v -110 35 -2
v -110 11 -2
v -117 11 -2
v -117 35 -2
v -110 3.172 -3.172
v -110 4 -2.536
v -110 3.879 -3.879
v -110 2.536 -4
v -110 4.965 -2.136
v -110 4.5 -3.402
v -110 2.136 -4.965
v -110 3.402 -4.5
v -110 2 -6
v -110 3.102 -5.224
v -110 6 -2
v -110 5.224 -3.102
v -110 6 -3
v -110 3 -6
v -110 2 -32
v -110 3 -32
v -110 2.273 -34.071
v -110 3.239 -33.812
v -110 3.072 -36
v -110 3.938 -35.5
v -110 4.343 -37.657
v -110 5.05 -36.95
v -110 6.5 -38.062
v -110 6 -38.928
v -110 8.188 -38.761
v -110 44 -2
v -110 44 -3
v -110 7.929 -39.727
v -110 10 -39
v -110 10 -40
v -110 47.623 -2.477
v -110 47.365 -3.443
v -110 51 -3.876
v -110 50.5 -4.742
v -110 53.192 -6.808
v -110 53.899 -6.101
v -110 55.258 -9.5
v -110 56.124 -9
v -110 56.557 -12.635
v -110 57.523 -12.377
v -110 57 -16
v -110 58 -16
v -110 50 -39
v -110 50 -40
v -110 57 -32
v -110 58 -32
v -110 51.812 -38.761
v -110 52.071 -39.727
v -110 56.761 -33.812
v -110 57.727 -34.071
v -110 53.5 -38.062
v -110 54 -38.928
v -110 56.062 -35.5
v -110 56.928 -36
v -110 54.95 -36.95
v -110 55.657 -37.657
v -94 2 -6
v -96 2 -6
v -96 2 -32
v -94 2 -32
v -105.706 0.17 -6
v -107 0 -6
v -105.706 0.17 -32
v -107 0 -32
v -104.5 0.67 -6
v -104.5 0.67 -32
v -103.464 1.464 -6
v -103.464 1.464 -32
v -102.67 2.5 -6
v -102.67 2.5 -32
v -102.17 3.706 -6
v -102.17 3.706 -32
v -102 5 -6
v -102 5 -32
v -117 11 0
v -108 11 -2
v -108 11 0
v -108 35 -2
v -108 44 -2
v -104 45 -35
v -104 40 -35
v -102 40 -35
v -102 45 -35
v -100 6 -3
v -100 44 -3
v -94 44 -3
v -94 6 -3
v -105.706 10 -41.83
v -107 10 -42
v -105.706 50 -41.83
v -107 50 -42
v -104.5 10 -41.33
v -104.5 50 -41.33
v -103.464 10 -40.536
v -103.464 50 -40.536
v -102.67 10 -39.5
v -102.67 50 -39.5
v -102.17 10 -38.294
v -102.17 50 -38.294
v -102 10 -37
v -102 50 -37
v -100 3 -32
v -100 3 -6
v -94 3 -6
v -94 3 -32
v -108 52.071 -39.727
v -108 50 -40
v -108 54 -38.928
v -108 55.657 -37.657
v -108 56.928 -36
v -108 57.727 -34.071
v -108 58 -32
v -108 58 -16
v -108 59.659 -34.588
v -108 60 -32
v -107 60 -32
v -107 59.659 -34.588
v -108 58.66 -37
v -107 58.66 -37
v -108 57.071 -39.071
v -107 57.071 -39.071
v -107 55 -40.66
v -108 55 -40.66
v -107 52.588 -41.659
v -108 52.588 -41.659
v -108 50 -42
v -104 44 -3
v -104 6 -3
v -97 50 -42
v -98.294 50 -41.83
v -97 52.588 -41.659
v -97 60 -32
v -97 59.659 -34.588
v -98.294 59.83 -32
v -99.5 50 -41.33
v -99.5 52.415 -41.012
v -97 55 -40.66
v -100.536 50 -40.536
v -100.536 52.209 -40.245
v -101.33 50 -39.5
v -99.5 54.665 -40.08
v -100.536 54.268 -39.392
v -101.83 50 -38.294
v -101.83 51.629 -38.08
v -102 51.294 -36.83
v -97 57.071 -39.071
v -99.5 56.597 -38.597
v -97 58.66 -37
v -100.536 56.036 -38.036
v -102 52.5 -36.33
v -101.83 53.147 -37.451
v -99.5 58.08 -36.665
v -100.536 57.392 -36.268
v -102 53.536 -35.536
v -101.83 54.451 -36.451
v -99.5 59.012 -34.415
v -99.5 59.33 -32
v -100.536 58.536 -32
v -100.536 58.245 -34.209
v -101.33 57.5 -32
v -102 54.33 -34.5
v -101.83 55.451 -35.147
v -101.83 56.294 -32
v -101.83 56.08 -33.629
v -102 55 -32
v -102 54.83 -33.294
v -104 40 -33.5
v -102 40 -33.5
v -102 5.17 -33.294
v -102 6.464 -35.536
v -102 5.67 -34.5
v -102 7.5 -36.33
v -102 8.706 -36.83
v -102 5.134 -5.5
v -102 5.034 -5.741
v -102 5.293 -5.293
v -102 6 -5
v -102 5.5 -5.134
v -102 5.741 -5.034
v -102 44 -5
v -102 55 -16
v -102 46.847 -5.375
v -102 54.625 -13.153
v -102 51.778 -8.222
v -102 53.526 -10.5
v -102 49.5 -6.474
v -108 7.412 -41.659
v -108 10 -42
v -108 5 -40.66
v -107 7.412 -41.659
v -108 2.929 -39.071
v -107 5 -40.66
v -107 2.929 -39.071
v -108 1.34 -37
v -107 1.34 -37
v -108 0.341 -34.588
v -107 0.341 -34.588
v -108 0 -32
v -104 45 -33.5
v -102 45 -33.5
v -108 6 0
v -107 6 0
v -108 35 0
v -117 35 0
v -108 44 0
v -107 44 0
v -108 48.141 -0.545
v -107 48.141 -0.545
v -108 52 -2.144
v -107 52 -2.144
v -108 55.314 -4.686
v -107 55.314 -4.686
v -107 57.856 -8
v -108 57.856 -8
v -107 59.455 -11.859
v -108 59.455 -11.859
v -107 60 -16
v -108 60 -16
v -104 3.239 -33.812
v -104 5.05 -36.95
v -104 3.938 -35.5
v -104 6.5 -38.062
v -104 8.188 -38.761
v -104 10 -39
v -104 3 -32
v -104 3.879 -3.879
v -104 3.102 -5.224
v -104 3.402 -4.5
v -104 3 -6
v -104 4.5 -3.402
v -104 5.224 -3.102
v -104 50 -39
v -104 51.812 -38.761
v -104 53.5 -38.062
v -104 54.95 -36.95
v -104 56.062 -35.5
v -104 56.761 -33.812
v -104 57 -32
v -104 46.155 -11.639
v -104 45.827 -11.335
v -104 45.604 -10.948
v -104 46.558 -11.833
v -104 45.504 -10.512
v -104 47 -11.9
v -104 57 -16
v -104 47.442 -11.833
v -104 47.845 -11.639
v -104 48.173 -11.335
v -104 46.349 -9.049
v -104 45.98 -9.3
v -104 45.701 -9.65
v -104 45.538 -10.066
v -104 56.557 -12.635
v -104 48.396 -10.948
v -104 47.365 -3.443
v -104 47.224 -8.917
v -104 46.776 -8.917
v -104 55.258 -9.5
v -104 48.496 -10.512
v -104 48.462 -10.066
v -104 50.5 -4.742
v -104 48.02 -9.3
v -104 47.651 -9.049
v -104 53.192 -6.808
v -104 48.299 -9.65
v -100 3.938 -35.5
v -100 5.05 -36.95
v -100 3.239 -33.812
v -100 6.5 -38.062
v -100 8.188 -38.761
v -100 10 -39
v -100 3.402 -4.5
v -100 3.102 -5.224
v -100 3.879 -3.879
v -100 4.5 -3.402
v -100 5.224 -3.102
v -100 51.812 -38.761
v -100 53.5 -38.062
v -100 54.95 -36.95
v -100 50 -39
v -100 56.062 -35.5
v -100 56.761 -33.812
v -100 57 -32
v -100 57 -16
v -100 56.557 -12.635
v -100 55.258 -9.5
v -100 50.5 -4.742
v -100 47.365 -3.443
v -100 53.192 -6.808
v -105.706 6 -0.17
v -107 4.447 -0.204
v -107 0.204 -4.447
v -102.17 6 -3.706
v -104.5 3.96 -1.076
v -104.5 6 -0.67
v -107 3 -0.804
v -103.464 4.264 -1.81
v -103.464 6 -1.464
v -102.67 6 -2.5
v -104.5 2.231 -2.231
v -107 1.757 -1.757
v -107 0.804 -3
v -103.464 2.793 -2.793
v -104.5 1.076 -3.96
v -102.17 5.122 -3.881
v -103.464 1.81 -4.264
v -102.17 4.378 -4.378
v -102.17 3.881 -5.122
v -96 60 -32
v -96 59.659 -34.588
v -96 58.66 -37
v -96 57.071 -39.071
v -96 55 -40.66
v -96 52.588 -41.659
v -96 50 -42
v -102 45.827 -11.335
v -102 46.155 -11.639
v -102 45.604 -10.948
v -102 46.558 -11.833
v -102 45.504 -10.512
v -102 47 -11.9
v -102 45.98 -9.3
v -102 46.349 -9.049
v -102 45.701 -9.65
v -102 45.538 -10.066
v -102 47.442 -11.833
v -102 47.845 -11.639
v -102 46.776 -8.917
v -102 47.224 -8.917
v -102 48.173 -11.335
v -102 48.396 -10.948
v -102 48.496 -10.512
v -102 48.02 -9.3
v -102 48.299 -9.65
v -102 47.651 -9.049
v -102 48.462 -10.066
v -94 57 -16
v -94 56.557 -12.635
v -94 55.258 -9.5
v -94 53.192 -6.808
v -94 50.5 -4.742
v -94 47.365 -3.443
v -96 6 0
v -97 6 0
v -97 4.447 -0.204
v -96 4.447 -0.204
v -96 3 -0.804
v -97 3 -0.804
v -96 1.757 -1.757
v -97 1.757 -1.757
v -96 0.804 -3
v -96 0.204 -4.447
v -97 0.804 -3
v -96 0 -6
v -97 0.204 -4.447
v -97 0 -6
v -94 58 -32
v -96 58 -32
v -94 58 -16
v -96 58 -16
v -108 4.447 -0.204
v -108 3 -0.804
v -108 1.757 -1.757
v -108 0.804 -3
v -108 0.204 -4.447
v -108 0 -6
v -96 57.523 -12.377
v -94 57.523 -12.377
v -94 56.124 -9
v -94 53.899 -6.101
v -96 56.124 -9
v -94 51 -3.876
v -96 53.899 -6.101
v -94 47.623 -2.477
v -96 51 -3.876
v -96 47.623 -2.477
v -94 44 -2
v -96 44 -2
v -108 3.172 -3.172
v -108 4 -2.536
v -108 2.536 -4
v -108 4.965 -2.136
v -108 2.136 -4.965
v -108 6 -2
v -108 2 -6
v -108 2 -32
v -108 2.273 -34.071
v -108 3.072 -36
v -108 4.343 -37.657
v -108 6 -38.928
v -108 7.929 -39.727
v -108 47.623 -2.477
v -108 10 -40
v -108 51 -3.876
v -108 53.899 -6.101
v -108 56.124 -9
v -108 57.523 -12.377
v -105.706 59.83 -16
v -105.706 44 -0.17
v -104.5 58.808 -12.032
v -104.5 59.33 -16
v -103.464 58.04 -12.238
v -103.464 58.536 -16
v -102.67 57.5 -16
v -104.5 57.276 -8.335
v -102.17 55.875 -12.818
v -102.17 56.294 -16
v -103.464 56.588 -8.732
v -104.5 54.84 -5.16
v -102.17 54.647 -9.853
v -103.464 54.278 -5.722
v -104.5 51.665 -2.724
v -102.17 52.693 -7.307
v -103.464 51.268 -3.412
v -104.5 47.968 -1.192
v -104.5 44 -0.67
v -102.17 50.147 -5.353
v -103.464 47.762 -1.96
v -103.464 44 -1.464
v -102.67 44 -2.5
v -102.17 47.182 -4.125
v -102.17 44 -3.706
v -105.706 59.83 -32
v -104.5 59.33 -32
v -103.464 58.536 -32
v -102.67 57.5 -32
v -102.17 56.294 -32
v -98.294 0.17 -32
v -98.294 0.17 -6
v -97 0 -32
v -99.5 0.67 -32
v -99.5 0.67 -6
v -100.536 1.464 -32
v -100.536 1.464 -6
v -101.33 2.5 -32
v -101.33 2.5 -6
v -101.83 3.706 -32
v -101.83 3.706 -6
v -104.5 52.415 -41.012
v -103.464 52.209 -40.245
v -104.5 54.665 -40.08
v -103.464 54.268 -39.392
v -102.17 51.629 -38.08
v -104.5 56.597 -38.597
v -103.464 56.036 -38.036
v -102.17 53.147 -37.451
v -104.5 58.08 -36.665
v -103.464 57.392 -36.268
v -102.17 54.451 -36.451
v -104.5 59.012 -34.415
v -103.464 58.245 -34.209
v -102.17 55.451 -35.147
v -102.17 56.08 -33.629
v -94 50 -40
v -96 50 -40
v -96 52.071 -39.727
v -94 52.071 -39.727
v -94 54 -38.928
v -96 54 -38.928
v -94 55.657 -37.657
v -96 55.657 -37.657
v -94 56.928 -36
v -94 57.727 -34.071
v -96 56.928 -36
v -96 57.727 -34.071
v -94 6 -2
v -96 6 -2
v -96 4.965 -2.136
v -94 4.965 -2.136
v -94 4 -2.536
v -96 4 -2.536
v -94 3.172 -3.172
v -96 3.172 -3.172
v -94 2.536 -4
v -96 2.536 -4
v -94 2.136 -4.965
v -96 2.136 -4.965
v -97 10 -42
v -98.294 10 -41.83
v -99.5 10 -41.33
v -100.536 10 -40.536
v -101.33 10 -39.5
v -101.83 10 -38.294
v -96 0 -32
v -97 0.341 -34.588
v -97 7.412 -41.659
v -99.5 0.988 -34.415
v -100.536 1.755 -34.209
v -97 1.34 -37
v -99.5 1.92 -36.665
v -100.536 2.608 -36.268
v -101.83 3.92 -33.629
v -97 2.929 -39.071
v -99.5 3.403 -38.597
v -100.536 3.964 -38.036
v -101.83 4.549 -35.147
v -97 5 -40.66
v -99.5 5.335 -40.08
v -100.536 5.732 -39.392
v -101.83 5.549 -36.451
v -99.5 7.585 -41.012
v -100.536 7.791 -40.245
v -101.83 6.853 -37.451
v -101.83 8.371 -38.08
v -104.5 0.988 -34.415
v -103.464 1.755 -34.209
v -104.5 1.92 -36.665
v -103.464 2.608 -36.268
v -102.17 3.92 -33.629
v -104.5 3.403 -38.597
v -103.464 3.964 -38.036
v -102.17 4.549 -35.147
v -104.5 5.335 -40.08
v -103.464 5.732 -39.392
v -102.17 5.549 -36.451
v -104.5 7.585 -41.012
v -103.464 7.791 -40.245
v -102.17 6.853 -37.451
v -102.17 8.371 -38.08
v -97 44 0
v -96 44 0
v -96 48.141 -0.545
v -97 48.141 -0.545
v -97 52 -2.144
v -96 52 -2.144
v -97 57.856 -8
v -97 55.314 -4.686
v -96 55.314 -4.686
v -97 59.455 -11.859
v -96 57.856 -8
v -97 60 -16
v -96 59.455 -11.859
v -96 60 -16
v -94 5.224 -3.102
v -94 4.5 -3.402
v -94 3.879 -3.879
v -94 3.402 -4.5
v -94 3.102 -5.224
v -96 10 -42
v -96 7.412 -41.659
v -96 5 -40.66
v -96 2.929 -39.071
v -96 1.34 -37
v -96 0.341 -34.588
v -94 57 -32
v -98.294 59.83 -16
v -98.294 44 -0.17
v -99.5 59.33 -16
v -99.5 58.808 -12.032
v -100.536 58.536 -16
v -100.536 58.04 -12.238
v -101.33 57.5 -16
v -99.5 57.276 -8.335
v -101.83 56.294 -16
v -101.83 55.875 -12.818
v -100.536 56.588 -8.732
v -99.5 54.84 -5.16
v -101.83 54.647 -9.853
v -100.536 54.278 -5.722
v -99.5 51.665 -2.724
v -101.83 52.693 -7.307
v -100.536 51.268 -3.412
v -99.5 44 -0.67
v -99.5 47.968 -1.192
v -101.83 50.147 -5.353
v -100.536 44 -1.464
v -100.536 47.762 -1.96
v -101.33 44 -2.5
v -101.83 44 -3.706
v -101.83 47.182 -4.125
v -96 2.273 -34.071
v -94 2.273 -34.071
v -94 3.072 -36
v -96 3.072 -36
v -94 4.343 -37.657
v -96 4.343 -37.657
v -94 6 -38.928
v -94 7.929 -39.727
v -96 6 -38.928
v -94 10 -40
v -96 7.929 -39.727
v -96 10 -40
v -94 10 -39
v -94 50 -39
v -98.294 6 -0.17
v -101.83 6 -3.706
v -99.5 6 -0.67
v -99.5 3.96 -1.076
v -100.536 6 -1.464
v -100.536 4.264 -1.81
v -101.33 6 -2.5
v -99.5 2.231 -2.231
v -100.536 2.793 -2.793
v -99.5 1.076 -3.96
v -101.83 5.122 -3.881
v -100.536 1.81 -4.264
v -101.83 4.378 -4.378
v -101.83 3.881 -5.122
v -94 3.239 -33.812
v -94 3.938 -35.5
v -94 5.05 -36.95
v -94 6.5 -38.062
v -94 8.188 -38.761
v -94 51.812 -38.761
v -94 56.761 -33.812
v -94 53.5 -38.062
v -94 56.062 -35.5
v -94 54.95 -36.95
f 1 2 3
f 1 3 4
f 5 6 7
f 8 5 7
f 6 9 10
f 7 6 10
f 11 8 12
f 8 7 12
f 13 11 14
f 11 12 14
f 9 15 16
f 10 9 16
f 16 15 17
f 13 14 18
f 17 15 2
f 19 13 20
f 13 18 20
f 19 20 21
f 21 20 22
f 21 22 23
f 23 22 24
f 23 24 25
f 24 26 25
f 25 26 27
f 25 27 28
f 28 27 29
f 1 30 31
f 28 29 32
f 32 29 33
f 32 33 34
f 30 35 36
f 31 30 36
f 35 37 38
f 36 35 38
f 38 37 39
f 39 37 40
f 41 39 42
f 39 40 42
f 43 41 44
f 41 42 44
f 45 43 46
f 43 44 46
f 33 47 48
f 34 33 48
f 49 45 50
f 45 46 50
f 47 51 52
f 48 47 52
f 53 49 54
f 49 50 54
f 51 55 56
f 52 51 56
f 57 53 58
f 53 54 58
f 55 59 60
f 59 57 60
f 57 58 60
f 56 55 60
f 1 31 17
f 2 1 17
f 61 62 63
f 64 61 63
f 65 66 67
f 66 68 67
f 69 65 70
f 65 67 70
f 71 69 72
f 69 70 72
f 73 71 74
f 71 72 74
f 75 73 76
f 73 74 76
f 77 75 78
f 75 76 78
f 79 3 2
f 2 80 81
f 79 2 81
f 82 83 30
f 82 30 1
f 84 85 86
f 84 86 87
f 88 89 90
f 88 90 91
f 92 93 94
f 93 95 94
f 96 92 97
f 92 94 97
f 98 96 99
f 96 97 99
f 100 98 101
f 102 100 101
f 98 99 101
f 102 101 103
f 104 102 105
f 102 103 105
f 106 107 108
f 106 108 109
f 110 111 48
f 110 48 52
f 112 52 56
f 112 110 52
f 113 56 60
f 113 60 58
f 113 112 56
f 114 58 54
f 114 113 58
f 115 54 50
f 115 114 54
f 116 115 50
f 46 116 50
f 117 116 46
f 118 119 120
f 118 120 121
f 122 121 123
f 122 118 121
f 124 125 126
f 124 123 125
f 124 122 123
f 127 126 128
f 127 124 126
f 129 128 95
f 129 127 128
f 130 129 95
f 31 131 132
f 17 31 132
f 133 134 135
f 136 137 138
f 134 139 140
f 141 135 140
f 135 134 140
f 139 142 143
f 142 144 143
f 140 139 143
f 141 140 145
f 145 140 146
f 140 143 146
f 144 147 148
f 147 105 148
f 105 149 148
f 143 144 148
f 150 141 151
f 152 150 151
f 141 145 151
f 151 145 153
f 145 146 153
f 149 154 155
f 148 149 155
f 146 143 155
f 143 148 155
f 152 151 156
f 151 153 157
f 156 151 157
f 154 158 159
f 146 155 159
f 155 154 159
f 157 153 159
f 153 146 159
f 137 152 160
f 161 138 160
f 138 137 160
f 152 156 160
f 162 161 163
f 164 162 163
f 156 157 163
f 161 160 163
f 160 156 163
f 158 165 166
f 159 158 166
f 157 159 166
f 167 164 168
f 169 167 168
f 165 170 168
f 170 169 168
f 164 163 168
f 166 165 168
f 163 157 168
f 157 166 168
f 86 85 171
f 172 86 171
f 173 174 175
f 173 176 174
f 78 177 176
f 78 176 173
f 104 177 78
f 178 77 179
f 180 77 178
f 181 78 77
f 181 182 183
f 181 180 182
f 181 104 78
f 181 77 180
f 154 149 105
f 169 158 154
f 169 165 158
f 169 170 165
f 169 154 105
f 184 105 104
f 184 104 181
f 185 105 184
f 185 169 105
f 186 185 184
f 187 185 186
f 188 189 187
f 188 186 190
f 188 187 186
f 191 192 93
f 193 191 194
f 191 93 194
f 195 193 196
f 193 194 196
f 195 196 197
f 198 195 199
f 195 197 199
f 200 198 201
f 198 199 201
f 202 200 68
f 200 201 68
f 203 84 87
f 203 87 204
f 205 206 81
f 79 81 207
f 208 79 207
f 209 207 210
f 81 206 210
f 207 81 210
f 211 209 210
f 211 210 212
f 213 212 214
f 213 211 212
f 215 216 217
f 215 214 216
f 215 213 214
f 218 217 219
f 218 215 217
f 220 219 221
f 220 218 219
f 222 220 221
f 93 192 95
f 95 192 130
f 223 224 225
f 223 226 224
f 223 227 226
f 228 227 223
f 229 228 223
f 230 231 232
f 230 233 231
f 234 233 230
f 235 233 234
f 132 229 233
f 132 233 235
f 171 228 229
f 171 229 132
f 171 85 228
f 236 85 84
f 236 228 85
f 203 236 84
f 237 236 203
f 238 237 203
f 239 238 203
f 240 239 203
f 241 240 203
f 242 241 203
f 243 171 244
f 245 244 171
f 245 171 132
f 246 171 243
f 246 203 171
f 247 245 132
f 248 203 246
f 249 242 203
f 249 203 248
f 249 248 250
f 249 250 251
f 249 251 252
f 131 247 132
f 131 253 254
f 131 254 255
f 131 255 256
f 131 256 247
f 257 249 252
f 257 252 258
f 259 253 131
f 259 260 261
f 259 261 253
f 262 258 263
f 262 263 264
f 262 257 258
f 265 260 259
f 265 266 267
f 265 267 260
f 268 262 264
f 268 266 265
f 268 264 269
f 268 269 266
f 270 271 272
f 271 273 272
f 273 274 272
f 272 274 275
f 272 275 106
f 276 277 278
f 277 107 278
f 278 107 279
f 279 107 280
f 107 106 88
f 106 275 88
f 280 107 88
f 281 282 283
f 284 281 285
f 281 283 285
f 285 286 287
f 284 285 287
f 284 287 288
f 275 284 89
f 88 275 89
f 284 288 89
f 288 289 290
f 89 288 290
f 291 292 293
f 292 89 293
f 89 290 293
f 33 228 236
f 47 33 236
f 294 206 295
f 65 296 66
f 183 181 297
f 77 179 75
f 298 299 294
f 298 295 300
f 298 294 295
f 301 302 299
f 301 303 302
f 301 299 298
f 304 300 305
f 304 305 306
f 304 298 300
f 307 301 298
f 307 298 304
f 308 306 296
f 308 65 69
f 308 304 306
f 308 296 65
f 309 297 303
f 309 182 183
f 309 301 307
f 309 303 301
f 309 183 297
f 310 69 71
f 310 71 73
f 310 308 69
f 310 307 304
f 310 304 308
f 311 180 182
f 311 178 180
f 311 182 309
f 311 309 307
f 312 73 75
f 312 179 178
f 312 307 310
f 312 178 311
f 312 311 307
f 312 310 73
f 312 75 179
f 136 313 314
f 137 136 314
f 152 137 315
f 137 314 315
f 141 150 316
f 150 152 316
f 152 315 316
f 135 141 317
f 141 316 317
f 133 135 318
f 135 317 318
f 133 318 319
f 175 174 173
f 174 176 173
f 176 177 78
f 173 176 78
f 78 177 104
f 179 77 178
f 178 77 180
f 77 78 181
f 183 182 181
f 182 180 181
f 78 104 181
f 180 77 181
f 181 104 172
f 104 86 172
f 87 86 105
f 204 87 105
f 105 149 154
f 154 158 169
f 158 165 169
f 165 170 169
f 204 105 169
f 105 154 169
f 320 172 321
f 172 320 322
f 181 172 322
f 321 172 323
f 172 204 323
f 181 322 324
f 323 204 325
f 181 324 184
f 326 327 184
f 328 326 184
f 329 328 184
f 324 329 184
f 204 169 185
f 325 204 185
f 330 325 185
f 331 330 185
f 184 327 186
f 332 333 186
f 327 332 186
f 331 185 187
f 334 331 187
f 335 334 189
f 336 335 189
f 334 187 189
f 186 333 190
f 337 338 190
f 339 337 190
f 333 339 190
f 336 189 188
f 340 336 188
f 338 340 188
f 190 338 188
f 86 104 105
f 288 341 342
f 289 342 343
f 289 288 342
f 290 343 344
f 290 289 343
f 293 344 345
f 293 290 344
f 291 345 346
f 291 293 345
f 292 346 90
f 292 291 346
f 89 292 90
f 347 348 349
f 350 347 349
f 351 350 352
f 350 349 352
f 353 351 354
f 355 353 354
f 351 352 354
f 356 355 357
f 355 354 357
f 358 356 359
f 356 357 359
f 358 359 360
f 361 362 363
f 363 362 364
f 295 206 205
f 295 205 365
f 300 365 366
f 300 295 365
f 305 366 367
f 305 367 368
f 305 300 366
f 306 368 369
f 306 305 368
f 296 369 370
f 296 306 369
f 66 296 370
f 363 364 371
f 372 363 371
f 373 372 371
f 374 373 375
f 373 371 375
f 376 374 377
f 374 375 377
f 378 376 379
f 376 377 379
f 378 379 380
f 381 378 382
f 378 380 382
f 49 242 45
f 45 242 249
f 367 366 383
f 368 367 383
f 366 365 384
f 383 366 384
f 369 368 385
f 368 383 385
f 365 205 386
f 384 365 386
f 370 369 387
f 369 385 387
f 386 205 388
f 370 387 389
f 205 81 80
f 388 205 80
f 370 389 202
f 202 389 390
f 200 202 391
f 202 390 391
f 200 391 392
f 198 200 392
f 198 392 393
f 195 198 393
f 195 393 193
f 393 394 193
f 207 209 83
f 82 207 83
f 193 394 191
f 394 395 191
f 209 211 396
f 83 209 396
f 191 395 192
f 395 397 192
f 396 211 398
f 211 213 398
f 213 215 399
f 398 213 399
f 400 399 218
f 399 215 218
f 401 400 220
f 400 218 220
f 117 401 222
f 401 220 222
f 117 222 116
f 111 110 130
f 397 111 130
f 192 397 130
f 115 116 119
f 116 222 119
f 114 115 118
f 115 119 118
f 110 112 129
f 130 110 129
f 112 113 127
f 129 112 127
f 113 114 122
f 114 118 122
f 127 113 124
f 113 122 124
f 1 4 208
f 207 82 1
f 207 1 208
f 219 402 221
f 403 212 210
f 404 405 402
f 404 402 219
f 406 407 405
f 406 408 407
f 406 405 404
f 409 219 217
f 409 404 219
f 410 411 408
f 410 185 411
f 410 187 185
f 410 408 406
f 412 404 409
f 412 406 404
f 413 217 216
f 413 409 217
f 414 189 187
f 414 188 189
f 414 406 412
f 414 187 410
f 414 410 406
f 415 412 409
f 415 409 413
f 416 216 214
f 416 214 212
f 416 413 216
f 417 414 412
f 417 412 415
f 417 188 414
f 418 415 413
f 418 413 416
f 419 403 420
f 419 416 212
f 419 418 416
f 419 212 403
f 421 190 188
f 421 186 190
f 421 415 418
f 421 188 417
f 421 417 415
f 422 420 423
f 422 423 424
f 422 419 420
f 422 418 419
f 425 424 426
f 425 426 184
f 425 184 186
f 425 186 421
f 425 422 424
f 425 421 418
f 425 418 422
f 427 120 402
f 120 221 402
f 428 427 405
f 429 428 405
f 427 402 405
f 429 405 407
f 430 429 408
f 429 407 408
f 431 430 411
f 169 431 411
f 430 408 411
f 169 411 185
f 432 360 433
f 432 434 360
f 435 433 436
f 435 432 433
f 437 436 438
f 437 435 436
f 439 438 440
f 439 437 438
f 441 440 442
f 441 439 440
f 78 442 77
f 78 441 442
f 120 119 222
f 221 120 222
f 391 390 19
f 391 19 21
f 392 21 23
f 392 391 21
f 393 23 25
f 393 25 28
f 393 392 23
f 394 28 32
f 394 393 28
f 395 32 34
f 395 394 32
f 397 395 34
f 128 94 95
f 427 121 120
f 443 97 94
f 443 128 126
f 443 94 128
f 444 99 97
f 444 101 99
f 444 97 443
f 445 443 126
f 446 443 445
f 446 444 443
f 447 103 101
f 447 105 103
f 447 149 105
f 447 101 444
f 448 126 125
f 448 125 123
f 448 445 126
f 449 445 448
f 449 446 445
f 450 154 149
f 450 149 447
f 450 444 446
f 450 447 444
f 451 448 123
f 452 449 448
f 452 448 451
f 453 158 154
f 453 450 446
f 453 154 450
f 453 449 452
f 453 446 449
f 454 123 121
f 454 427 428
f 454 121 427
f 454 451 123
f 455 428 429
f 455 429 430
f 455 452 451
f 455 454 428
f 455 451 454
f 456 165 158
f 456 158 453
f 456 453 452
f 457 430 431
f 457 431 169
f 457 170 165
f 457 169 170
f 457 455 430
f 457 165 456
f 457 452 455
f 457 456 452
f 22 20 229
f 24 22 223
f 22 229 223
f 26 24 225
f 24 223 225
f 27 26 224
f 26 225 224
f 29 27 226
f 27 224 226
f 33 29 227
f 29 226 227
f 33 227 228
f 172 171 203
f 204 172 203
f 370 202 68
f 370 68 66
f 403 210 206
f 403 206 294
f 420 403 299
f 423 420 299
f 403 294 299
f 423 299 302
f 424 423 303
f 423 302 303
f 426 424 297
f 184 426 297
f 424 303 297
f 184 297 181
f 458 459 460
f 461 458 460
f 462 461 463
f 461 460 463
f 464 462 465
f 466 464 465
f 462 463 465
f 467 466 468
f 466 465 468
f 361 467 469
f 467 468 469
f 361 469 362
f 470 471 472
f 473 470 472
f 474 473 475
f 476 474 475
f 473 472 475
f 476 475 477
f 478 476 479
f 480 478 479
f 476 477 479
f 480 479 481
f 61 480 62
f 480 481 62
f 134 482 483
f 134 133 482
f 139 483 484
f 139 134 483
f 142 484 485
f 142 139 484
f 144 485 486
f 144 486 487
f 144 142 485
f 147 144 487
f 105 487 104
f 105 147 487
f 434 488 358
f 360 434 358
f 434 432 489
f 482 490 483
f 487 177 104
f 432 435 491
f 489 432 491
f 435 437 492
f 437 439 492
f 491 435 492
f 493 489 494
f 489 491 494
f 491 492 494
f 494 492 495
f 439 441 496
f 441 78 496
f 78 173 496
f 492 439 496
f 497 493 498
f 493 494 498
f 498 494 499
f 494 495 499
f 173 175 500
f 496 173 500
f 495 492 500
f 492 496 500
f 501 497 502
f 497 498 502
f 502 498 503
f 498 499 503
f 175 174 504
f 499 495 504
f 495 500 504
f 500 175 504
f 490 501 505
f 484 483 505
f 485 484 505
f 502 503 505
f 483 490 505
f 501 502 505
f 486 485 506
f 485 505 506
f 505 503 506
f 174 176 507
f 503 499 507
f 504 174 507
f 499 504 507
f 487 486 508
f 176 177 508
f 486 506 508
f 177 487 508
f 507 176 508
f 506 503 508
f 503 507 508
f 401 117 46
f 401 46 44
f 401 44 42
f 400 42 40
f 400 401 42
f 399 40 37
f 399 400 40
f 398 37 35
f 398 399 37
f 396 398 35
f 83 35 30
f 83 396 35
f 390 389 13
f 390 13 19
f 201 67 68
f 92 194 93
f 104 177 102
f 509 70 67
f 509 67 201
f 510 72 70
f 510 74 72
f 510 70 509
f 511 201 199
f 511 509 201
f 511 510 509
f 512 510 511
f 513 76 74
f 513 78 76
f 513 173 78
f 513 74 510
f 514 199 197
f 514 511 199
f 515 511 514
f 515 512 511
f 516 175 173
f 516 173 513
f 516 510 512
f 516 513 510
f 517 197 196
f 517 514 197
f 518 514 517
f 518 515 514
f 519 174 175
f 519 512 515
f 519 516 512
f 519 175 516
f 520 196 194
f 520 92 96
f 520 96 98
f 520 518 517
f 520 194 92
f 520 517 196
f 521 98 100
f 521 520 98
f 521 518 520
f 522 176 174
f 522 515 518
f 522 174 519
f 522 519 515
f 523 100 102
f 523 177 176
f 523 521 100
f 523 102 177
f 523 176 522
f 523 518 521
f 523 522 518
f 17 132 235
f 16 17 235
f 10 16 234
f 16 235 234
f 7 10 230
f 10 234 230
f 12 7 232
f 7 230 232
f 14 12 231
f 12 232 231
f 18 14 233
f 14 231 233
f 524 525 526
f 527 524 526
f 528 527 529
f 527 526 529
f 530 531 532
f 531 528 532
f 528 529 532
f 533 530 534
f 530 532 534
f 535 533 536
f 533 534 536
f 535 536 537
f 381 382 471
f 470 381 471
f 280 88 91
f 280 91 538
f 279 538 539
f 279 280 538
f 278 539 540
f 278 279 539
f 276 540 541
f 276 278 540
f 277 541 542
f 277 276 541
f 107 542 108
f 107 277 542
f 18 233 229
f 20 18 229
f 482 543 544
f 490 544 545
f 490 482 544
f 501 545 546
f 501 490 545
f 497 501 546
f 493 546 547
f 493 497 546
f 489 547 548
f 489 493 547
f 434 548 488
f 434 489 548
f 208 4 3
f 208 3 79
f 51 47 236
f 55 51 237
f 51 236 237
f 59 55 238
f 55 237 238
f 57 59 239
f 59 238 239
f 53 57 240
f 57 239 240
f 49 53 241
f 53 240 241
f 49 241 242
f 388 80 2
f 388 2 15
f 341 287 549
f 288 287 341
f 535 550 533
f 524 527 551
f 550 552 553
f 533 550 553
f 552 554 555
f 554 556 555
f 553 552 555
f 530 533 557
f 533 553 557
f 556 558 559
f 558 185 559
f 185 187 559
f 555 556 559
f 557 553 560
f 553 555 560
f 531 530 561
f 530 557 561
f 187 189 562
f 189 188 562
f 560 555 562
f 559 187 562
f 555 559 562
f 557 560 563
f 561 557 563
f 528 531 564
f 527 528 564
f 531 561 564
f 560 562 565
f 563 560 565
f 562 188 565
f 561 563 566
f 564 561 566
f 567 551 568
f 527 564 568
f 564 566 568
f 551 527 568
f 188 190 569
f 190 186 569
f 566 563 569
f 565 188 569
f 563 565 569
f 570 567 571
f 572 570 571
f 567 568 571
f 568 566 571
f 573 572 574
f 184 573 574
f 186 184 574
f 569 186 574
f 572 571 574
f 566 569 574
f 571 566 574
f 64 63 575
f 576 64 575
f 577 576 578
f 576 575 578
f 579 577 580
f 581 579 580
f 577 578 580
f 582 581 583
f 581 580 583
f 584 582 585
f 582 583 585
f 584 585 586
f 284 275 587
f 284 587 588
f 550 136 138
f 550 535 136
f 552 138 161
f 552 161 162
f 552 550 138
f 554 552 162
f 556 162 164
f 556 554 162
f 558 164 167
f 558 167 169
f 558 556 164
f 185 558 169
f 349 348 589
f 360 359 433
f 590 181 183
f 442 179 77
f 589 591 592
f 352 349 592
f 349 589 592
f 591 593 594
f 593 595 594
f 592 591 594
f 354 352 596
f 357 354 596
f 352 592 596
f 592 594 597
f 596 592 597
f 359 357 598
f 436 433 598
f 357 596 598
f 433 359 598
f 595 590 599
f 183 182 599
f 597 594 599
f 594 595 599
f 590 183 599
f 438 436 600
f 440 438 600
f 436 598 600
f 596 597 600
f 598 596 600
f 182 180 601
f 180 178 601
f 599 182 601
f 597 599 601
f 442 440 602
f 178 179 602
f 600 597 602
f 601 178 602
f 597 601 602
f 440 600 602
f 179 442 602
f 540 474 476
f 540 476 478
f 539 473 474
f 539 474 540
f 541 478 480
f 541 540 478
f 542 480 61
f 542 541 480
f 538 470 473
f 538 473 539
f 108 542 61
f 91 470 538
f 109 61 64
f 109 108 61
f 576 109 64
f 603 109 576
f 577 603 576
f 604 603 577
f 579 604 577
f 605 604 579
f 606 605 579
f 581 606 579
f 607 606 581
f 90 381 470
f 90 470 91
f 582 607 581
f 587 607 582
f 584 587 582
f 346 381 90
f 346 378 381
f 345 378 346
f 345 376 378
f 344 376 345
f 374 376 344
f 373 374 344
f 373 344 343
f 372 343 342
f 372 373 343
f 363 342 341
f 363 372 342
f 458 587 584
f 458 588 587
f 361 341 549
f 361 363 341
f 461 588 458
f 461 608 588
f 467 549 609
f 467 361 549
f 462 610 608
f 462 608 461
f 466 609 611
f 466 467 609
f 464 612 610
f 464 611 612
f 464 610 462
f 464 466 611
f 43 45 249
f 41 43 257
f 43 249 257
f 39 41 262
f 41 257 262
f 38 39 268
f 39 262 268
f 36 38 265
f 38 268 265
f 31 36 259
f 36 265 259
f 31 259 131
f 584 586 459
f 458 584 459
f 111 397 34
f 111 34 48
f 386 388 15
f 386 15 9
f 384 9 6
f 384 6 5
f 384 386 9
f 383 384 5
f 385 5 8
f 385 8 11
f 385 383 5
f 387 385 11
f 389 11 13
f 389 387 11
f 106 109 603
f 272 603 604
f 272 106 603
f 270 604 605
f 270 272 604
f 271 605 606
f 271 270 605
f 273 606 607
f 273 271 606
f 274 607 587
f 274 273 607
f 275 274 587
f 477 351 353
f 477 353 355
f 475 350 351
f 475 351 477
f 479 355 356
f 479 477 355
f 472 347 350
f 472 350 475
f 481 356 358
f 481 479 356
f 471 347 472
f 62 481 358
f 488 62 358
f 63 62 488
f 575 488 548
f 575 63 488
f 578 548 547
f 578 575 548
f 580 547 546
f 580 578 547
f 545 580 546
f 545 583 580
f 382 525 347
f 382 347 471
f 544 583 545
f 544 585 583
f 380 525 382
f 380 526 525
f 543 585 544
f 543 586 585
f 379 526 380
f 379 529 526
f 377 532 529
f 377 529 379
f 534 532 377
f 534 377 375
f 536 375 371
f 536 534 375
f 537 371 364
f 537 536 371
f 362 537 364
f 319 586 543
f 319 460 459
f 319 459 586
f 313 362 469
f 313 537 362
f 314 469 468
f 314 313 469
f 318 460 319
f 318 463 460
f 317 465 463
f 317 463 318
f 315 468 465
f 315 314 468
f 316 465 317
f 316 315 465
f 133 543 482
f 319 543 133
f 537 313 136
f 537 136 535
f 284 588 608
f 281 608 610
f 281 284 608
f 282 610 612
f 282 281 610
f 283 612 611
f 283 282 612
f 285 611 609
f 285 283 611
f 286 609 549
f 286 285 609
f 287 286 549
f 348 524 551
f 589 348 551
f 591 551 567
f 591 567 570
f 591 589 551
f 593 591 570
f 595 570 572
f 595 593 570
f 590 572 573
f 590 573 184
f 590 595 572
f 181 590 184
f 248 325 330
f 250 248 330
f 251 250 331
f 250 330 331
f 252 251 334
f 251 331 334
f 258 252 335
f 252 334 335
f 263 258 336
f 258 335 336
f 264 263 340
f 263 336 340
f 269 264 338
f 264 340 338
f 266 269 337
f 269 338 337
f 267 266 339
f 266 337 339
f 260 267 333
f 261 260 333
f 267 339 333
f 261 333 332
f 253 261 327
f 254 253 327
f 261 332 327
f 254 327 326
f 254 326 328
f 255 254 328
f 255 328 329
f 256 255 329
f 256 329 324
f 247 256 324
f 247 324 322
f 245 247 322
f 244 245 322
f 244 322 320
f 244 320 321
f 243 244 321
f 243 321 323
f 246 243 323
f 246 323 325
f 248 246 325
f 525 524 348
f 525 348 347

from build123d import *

# Parameters (mm, degrees)
SKETCH_1_W           = 1
SKETCH_1_H           = 1.9
SKETCH_1_W_2         = 2
SKETCH_1_H_2         = 60
EXTRUDE_1_DEPTH      = 90
SKETCH_2_W           = 2
SKETCH_2_H           = 24
CUT_EXTRUDE_1_DEPTH  = 117.034477635
SKETCH_4_W           = 1
SKETCH_4_H           = 0.1
EXTRUDE_2_DEPTH      = 3
SKETCH_5_W           = 2
SKETCH_5_H           = 24
EXTRUDE_3_DEPTH      = 10
SKETCH_6_W           = 42
SKETCH_6_H           = 60
EXTRUDE_4_DEPTH      = 2
EXTRUDE_5_REACH      = 122.702
SKETCH_8_W           = 10
SKETCH_8_H           = 2
FILLET_1_R           = 14
FILLET_2_R           = 16
FILLET_4_R           = 8
FILLET_5_R           = 10
FILLET_6_R           = 4
FILLET_7_R           = 6
FILLET_8_R           = 5
FILLET_9_R           = 1
CUT_EXTRUDE_START    = -80
CUT_EXTRUDE_2_DEPTH  = 80
CUT_EXTRUDE_3_DEPTH  = 16
EXTRUDE_7_DEPTH      = 2
EXTRUDE_7_DEPTH_BACK = 4
SKETCH_13_W          = 2
SKETCH_13_H          = 24
EXTRUDE_8_DEPTH      = 9
SKETCH_14_W          = 1.5
SKETCH_14_H          = 5
CUT_EXTRUDE_4_DEPTH  = 75.384138151
SKETCH_15_R          = 1.5
CUT_EXTRUDE_5_DEPTH  = 75.759614822


with BuildPart() as part:
    # Эскиз1 → Бобышка-Вытянуть1 (new body)
    with BuildSketch(Plane(origin=(0, 0, 0), x_dir=(0, 0, -1), z_dir=(1, 0, 0))):
        Polygon((18, 60), (2, 60), (2, 58), (18, 58), (18, 58.1), align=None)
        with Locations((18.5, 59.05)):
            Rectangle(SKETCH_1_W, SKETCH_1_H)
        Polygon((40, 60), (19, 60), (19, 58.1), (19, 58), (40, 58), align=None)
        with Locations((1, 30)):
            Rectangle(SKETCH_1_W_2, SKETCH_1_H_2)
        Polygon((40, 2), (40, 0), (42, 0), (42, 60), (40, 60), (40, 58), align=None)
        Polygon((19, 1.9), (19, 0), (40, 0), (40, 2), (19, 2), align=None)
        with Locations((18.5, 0.95)):
            Rectangle(SKETCH_1_W, SKETCH_1_H)
        Polygon((2, 2), (2, 0), (18, 0), (18, 1.9), (18, 2), align=None)
    extrude(amount=-EXTRUDE_1_DEPTH)

    # Эскиз2 → Вырез-Вытянуть1 (cut, through all)
    with BuildSketch(Plane(origin=(0, 0, 0), x_dir=(0, 0, -1), z_dir=(1, 0, 0))):
        with Locations((1, 23)):
            Rectangle(SKETCH_2_W, SKETCH_2_H)
    extrude(amount=-CUT_EXTRUDE_1_DEPTH, mode=Mode.SUBTRACT)

    # Эскиз4 → Бобышка-Вытянуть2 (add)
    with BuildSketch(Plane.ZY.offset(90)):
        with Locations((-18.5, 58.05)):
            Rectangle(SKETCH_4_W, SKETCH_4_H)
        with Locations((-18.5, 1.95)):
            Rectangle(SKETCH_4_W, SKETCH_4_H)
    extrude(amount=-EXTRUDE_2_DEPTH)

    # Эскиз5 → Бобышка-Вытянуть3 (add)
    with BuildSketch(Plane.ZY.offset(90)):
        Polygon((0, 11), (-2, 11), (-2, 2), (-40, 2), (-40, 58), (-2, 58), (-2, 35), (0, 35), (0, 60), (-42, 60), (-42, 0), (0, 0), align=None)
        with Locations((-1, 23)):
            Rectangle(SKETCH_5_W, SKETCH_5_H)
    extrude(amount=EXTRUDE_3_DEPTH)

    # Эскиз6 → Бобышка-Вытянуть4 (add)
    with BuildSketch(Plane.ZY.offset(100)):
        with Locations((-21, 30)):
            Rectangle(SKETCH_6_W, SKETCH_6_H)
    extrude(amount=EXTRUDE_4_DEPTH)

    # Эскиз8 → Бобышка-Вытянуть5 (add, up to next)
    with BuildSketch(Plane(origin=(0, 11, 0), x_dir=(1, 0, 0), z_dir=(0, 1, 0)), mode=Mode.PRIVATE) as extrude_5_sk1:
        with Locations((-85, 1)):
            Rectangle(SKETCH_8_W, SKETCH_8_H)
    extrude_5_tool1 = extrude(extrude_5_sk1.sketch, amount=EXTRUDE_5_REACH, mode=Mode.PRIVATE) - part.part
    add(extrude_5_tool1.solids().sort_by_distance((-85, 11, -1))[0])

    # Скругление1
    fillet_1_edges = [part.edges().sort_by_distance(p)[0] for p in [
        (-50, 58, -2),
    ]]
    fillet(fillet_1_edges, radius=FILLET_1_R)

    # Скругление2
    fillet_2_edges = [part.edges().sort_by_distance(p)[0] for p in [
        (-51, 60, 0),
    ]]
    fillet(fillet_2_edges, radius=FILLET_2_R)

    # Скругление4
    fillet_4_edges = [part.edges().sort_by_distance(p)[0] for p in [
        (-50, 2, -40),
        (-50, 58, -40),
    ]]
    fillet(fillet_4_edges, radius=FILLET_4_R)

    # Скругление5
    fillet_5_edges = [part.edges().sort_by_distance(p)[0] for p in [
        (-51, 60, -42),
        (-51, 0, -42),
    ]]
    fillet(fillet_5_edges, radius=FILLET_5_R)

    # Скругление6
    fillet_6_edges = [part.edges().sort_by_distance(p)[0] for p in [
        (-50, 2, -2),
    ]]
    fillet(fillet_6_edges, radius=FILLET_6_R)

    # Скругление7
    fillet_7_edges = [part.edges().sort_by_distance(p)[0] for p in [
        (-51, 0, 0),
    ]]
    fillet(fillet_7_edges, radius=FILLET_7_R)

    # Скругление8
    fillet_8_edges = [part.edges().sort_by_distance(p)[0] for p in [
        (-102, 60, -24),
        (-102, 55.313708499, -4.686291501),
        (-102, 0, -19),
        (-102, 30, -42),
        (-102, 57.071067812, -39.071067812),
        (-102, 2.928932188, -39.071067812),
        (-102, 25, 0),
        (-102, 1.757359313, -1.757359313),
    ]]
    fillet(fillet_8_edges, radius=FILLET_8_R)

    # Скругление9
    fillet_9_edges = [part.edges().sort_by_distance(p)[0] for p in [
        (-100, 25, -2),
        (-100, 53.899494937, -6.100505063),
        (-100, 30, -40),
        (-100, 58, -24),
        (-100, 55.656854249, -37.656854249),
        (-100, 4.343145751, -37.656854249),
        (-100, 2, -19),
        (-100, 3.171572875, -3.171572875),
    ]]
    fillet(fillet_9_edges, radius=FILLET_9_R)

    # Эскиз9 → Вырез-Вытянуть2 (cut)
    with BuildSketch(Plane(origin=(0, 0, 0), x_dir=(0, 0, -1), z_dir=(1, 0, 0)).offset(CUT_EXTRUDE_START)):
        with BuildLine():
            Line((0, 11), (0, 6))
            ThreePointArc((0, 6), (1.757359313, 1.757359313), (6, 0))
            Line((6, 0), (32, 0))
            ThreePointArc((32, 0), (39.071067812, 2.928932188), (42, 10))
            Line((42, 10), (42, 50))
            ThreePointArc((42, 50), (39.071067812, 57.071067812), (32, 60))
            Line((32, 60), (16, 60))
            ThreePointArc((16, 60), (4.686291501, 55.313708499), (0, 44))
            Line((0, 44), (0, 35))
            Line((0, 35), (2, 35))
            Line((2, 35), (2, 44))
            ThreePointArc((2, 44), (6.100505063, 53.899494937), (16, 58))
            Line((16, 58), (18, 58))
            Line((18, 58), (18, 58.1))
            Line((18, 58.1), (19, 58.1))
            Line((19, 58.1), (19, 58))
            Line((19, 58), (32, 58))
            ThreePointArc((32, 58), (37.656854249, 55.656854249), (40, 50))
            Line((40, 50), (40, 10))
            ThreePointArc((40, 10), (37.656854249, 4.343145751), (32, 2))
            Line((32, 2), (19, 2))
            Line((19, 2), (19, 1.9))
            Line((19, 1.9), (18, 1.9))
            Line((18, 1.9), (18, 2))
            Line((18, 2), (6, 2))
            ThreePointArc((6, 2), (3.171572875, 3.171572875), (2, 6))
            Line((2, 6), (2, 11))
            Line((2, 11), (0, 11))
        make_face()
    extrude(amount=CUT_EXTRUDE_2_DEPTH, mode=Mode.SUBTRACT)

    # Эскиз10 → Вырез-Вытянуть3 (cut)
    with BuildSketch(Plane(origin=(-80, 0, 0), x_dir=(0, 0, -1), z_dir=(1, 0, 0))):
        with BuildLine():
            Line((0, 44), (0, 6))
            ThreePointArc((0, 6), (1.757359313, 1.757359313), (6, 0))
            Line((6, 0), (32, 0))
            ThreePointArc((32, 0), (39.071067812, 2.928932188), (42, 10))
            Line((42, 10), (42, 50))
            ThreePointArc((42, 50), (39.071067812, 57.071067812), (32, 60))
            Line((32, 60), (16, 60))
            ThreePointArc((16, 60), (4.686291501, 55.313708499), (0, 44))
        make_face()
    extrude(amount=-CUT_EXTRUDE_3_DEPTH, mode=Mode.SUBTRACT)

    # Эскиз12 → Бобышка-Вытянуть7 (add, two sides: drawn at the far end of the back side and taken through both)
    with BuildSketch(Plane(origin=(-96, 0, 0), x_dir=(0, 0, -1), z_dir=(1, 0, 0)).offset(-EXTRUDE_7_DEPTH_BACK)):
        with BuildLine():
            Line((2, 44), (2, 6))
            ThreePointArc((2, 6), (3.171572875, 3.171572875), (6, 2))
            Line((6, 2), (32, 2))
            ThreePointArc((32, 2), (37.656854249, 4.343145751), (40, 10))
            Line((40, 10), (40, 50))
            ThreePointArc((40, 50), (37.656854249, 55.656854249), (32, 58))
            Line((32, 58), (16, 58))
            ThreePointArc((16, 58), (6.100505063, 53.899494937), (2, 44))
        make_face()
        with BuildLine():
            Line((3, 44), (3, 6))
            ThreePointArc((3, 6), (3.878679656, 3.878679656), (6, 3))
            Line((6, 3), (32, 3))
            ThreePointArc((32, 3), (36.949747468, 5.050252532), (39, 10))
            Line((39, 10), (39, 50))
            ThreePointArc((39, 50), (36.949747468, 54.949747468), (32, 57))
            Line((32, 57), (16, 57))
            ThreePointArc((16, 57), (6.807611845, 53.192388155), (3, 44))
        make_face(mode=Mode.SUBTRACT)
    extrude(amount=EXTRUDE_7_DEPTH + EXTRUDE_7_DEPTH_BACK)


with BuildPart() as body_2:
    # Зеркальное отражение1: mirrored copy
    add(part.part.mirror(Plane.ZY.offset(102)))

    # Эскиз13 → Бобышка-Вытянуть8 (add)
    with BuildSketch(Plane.ZY.offset(108)):
        with Locations((-1, 23)):
            Rectangle(SKETCH_13_W, SKETCH_13_H)
    extrude(amount=EXTRUDE_8_DEPTH)

    # Эскиз14 → Вырез-Вытянуть4 (cut, through all)
    with BuildSketch(Plane.ZY.offset(104)):
        with Locations((-34.25, 42.5)):
            Rectangle(SKETCH_14_W, SKETCH_14_H)
    extrude(amount=-CUT_EXTRUDE_4_DEPTH, mode=Mode.SUBTRACT)

    # Эскиз15 → Вырез-Вытянуть5 (cut, through all)
    with BuildSketch(Plane(origin=(-102, 0, 0), x_dir=(0, 0, -1), z_dir=(1, 0, 0))):
        with Locations((10.4, 47)):
            Circle(SKETCH_15_R)
    extrude(amount=-CUT_EXTRUDE_5_DEPTH, mode=Mode.SUBTRACT)


solid = Compound([part.part, body_2.part])
